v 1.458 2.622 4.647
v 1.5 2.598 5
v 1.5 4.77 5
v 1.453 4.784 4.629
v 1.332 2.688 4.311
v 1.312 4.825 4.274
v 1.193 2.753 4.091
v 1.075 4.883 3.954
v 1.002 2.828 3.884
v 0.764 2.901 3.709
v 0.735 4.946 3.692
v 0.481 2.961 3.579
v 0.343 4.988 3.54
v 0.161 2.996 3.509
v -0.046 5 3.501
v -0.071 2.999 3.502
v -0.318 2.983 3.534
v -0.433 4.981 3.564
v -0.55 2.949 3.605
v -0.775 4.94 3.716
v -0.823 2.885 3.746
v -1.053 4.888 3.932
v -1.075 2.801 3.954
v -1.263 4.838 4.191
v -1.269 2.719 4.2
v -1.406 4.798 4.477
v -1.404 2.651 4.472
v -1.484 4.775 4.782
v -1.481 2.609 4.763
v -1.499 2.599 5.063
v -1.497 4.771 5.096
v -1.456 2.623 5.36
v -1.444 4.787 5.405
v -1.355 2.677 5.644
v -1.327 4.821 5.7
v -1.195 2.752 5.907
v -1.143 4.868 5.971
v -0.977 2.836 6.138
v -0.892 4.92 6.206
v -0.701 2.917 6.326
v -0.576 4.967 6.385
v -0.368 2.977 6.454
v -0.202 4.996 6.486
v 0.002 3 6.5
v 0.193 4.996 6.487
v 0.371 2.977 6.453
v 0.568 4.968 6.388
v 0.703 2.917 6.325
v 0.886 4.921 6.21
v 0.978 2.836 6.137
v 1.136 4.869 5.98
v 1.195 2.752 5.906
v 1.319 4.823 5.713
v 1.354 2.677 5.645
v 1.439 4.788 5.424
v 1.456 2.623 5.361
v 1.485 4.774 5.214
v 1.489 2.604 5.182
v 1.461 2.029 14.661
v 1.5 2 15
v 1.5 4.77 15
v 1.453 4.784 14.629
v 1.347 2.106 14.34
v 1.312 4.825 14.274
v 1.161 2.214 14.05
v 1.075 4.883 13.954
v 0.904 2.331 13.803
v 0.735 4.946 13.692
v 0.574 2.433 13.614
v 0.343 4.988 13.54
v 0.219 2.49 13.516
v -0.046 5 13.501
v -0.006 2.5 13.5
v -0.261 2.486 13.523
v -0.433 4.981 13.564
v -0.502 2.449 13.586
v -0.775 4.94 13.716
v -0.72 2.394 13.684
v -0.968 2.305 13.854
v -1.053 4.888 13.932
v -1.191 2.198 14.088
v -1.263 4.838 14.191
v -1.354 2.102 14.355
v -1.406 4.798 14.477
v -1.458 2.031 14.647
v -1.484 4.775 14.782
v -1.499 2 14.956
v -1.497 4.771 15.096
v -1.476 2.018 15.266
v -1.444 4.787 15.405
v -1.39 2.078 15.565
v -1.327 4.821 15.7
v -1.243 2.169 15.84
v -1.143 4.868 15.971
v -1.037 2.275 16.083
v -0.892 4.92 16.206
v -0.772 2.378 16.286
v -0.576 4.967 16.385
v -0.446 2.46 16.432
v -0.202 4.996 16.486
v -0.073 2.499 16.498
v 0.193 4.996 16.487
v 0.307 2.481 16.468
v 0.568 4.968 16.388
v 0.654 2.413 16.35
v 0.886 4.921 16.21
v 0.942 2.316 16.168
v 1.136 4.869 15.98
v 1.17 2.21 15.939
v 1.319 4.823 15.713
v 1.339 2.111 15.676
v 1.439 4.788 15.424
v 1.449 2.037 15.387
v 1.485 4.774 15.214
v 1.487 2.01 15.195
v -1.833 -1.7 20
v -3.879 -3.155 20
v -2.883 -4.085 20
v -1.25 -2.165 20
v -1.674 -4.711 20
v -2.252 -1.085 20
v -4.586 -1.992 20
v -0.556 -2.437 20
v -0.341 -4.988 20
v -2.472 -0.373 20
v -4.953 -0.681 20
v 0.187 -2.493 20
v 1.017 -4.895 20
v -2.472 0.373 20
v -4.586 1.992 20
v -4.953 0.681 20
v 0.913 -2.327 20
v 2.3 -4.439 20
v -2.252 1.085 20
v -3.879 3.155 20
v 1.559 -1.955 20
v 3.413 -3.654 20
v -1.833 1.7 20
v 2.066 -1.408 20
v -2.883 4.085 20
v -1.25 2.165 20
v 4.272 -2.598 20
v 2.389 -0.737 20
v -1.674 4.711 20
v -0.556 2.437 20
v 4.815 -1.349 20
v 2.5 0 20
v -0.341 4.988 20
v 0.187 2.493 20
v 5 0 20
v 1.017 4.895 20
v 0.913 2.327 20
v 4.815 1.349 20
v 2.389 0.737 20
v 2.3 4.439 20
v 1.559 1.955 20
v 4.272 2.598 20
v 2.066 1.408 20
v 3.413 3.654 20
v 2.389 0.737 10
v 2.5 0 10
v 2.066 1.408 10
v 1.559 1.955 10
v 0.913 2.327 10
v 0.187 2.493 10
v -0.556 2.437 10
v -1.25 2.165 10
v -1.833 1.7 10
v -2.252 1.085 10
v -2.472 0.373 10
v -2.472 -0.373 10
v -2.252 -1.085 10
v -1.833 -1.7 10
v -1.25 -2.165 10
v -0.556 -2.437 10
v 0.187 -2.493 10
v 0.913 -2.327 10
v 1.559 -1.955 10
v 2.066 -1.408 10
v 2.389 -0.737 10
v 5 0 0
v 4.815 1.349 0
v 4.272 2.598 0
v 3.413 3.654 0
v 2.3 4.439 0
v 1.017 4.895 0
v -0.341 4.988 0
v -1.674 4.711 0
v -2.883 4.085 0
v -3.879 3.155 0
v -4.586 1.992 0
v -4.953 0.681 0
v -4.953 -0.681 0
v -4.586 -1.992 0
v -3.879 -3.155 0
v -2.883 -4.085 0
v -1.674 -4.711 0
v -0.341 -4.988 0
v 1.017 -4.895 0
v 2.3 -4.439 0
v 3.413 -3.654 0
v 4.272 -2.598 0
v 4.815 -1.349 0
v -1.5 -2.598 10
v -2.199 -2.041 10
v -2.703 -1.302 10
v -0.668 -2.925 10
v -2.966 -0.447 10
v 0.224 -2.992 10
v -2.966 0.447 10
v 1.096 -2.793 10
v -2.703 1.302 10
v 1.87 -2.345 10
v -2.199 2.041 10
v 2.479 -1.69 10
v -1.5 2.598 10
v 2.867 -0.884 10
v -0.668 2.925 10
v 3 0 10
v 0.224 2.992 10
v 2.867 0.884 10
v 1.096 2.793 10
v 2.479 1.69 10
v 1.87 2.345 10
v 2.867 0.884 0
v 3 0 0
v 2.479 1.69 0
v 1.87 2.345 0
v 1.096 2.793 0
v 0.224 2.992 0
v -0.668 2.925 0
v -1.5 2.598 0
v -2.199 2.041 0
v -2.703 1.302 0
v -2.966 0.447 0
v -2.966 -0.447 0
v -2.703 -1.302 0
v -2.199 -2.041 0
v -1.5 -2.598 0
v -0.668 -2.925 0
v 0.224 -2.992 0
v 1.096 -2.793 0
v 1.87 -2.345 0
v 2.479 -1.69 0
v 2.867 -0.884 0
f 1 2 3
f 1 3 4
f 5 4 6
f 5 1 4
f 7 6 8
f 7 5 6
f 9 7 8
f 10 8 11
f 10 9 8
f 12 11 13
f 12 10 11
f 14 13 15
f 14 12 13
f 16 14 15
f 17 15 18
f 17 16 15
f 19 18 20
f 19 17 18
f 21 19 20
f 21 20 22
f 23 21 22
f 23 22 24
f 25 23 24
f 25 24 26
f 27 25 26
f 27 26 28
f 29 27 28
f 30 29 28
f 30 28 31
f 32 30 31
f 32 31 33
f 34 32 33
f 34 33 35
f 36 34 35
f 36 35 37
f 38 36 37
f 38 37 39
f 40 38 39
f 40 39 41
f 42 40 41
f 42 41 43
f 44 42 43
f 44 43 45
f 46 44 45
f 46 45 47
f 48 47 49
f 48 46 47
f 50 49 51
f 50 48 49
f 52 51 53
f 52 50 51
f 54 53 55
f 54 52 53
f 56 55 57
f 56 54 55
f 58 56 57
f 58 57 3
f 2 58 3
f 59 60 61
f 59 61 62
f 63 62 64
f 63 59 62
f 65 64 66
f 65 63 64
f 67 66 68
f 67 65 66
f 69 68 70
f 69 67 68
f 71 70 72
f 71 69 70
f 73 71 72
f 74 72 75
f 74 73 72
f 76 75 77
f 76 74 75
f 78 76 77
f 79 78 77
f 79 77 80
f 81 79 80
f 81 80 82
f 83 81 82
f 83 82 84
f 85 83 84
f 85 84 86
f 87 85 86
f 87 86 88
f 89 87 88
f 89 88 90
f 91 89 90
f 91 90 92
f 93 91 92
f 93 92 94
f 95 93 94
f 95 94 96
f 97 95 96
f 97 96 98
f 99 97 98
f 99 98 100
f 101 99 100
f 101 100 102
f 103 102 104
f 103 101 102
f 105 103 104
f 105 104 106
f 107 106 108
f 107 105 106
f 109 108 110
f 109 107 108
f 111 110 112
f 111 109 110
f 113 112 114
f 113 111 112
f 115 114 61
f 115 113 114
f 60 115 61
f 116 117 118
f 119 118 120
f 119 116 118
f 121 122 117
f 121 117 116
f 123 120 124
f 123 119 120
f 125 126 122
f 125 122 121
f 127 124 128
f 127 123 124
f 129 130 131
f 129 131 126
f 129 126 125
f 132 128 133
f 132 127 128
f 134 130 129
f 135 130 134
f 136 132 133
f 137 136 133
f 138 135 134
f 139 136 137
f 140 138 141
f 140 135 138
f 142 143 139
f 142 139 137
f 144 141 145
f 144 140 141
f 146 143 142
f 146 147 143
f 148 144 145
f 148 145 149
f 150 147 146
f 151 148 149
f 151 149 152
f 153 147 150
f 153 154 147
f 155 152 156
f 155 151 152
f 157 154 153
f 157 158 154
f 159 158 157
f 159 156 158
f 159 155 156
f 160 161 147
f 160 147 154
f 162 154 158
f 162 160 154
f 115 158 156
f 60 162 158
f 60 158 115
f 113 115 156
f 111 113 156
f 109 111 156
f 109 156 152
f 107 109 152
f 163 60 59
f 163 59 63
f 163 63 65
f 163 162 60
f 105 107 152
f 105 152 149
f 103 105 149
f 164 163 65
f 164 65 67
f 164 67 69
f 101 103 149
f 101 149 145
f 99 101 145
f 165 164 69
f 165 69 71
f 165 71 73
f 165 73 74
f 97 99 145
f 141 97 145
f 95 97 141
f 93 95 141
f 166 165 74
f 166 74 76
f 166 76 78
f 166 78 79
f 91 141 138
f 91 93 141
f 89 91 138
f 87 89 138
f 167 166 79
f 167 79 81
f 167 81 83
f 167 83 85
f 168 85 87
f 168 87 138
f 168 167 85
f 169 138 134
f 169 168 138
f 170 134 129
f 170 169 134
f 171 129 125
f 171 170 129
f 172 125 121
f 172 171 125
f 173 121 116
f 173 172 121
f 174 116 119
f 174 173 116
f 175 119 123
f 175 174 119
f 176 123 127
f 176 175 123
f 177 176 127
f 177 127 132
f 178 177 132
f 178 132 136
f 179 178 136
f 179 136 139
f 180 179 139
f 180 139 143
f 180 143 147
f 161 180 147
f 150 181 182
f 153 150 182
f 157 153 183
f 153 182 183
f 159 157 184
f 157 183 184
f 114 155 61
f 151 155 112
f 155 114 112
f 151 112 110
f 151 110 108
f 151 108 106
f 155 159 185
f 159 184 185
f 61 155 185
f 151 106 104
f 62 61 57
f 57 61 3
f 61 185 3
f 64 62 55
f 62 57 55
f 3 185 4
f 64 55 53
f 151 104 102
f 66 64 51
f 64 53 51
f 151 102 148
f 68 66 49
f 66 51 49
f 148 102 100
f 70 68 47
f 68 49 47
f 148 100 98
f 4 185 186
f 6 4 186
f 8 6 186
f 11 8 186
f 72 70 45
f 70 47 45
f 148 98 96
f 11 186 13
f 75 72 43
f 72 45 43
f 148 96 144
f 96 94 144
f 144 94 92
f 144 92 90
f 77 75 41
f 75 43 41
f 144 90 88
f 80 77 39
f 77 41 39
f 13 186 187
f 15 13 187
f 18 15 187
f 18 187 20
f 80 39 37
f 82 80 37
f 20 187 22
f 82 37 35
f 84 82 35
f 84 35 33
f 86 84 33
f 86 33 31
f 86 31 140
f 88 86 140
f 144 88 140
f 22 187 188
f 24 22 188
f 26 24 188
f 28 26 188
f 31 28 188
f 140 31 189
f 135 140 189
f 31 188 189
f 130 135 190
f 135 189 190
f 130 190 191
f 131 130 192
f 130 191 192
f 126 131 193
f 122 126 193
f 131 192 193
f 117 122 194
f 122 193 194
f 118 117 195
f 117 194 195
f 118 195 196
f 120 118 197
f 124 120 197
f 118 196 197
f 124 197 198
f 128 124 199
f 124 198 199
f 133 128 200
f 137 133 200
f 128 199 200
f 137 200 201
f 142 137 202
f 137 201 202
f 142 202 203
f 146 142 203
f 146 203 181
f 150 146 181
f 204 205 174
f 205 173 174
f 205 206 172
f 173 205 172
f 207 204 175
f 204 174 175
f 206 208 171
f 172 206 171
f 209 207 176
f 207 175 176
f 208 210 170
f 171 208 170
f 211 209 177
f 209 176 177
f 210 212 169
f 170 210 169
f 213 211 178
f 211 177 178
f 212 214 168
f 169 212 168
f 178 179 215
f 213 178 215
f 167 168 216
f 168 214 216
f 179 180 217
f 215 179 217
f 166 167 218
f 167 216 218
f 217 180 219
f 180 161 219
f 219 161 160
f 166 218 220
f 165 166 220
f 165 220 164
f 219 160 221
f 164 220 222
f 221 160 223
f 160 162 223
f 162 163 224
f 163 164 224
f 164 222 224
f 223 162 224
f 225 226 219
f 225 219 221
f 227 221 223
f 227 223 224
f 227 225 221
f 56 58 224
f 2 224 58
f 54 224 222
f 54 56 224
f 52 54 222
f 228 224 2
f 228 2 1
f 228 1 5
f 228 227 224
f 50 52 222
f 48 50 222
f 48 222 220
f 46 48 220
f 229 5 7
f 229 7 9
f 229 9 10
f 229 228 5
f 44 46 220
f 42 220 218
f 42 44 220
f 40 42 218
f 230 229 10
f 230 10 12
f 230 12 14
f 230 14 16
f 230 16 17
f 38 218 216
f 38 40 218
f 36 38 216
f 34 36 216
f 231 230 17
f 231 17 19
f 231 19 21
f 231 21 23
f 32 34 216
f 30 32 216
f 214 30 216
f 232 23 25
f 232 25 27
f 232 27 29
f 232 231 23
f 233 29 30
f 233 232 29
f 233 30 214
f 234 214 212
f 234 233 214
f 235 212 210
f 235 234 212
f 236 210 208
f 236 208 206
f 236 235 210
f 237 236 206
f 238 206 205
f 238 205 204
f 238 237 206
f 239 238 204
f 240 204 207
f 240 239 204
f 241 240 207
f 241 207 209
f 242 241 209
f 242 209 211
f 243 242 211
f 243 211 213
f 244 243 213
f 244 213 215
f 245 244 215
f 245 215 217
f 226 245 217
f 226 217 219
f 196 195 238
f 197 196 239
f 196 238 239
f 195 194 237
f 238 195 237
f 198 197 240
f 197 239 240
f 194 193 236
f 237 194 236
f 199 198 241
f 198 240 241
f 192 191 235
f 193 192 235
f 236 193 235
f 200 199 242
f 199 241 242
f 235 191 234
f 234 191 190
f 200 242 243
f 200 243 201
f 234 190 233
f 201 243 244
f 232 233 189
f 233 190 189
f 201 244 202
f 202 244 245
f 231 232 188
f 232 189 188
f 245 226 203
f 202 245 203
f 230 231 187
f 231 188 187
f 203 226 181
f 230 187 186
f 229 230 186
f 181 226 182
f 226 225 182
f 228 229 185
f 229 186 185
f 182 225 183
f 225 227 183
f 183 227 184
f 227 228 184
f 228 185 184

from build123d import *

# Parameters (mm, degrees)
SKETCH1_R           = 5
SKETCH1_R_2         = 3
BOSS_EXTRUDE1_DEPTH = 10
SKETCH2_R           = 5
SKETCH2_R_2         = 2.5
BOSS_EXTRUDE2_DEPTH = 10
SKETCH3_R           = 1.5
CUT_EXTRUDE1_DEPTH  = 10


with BuildPart() as part:
    # Sketch1 → Boss-Extrude1 (new body)
    with BuildSketch(Plane.XY):
        Circle(SKETCH1_R)
        Circle(SKETCH1_R_2, mode=Mode.SUBTRACT)
    extrude(amount=BOSS_EXTRUDE1_DEPTH)

    # Sketch2 → Boss-Extrude2 (add)
    with BuildSketch(Plane.XY.offset(10)):
        Circle(SKETCH2_R)
        Circle(SKETCH2_R_2, mode=Mode.SUBTRACT)
    extrude(amount=BOSS_EXTRUDE2_DEPTH)

    # Sketch3 → Cut-Extrude1 (cut)
    with BuildSketch(Plane(origin=(0, 0, 0), x_dir=(1, 0, 0), z_dir=(0, 1, 0))):
        with Locations((0, -5)):
            Circle(SKETCH3_R)
        with Locations((0, -15)):
            Circle(SKETCH3_R)
    extrude(amount=CUT_EXTRUDE1_DEPTH, mode=Mode.SUBTRACT)


solid = part.part
